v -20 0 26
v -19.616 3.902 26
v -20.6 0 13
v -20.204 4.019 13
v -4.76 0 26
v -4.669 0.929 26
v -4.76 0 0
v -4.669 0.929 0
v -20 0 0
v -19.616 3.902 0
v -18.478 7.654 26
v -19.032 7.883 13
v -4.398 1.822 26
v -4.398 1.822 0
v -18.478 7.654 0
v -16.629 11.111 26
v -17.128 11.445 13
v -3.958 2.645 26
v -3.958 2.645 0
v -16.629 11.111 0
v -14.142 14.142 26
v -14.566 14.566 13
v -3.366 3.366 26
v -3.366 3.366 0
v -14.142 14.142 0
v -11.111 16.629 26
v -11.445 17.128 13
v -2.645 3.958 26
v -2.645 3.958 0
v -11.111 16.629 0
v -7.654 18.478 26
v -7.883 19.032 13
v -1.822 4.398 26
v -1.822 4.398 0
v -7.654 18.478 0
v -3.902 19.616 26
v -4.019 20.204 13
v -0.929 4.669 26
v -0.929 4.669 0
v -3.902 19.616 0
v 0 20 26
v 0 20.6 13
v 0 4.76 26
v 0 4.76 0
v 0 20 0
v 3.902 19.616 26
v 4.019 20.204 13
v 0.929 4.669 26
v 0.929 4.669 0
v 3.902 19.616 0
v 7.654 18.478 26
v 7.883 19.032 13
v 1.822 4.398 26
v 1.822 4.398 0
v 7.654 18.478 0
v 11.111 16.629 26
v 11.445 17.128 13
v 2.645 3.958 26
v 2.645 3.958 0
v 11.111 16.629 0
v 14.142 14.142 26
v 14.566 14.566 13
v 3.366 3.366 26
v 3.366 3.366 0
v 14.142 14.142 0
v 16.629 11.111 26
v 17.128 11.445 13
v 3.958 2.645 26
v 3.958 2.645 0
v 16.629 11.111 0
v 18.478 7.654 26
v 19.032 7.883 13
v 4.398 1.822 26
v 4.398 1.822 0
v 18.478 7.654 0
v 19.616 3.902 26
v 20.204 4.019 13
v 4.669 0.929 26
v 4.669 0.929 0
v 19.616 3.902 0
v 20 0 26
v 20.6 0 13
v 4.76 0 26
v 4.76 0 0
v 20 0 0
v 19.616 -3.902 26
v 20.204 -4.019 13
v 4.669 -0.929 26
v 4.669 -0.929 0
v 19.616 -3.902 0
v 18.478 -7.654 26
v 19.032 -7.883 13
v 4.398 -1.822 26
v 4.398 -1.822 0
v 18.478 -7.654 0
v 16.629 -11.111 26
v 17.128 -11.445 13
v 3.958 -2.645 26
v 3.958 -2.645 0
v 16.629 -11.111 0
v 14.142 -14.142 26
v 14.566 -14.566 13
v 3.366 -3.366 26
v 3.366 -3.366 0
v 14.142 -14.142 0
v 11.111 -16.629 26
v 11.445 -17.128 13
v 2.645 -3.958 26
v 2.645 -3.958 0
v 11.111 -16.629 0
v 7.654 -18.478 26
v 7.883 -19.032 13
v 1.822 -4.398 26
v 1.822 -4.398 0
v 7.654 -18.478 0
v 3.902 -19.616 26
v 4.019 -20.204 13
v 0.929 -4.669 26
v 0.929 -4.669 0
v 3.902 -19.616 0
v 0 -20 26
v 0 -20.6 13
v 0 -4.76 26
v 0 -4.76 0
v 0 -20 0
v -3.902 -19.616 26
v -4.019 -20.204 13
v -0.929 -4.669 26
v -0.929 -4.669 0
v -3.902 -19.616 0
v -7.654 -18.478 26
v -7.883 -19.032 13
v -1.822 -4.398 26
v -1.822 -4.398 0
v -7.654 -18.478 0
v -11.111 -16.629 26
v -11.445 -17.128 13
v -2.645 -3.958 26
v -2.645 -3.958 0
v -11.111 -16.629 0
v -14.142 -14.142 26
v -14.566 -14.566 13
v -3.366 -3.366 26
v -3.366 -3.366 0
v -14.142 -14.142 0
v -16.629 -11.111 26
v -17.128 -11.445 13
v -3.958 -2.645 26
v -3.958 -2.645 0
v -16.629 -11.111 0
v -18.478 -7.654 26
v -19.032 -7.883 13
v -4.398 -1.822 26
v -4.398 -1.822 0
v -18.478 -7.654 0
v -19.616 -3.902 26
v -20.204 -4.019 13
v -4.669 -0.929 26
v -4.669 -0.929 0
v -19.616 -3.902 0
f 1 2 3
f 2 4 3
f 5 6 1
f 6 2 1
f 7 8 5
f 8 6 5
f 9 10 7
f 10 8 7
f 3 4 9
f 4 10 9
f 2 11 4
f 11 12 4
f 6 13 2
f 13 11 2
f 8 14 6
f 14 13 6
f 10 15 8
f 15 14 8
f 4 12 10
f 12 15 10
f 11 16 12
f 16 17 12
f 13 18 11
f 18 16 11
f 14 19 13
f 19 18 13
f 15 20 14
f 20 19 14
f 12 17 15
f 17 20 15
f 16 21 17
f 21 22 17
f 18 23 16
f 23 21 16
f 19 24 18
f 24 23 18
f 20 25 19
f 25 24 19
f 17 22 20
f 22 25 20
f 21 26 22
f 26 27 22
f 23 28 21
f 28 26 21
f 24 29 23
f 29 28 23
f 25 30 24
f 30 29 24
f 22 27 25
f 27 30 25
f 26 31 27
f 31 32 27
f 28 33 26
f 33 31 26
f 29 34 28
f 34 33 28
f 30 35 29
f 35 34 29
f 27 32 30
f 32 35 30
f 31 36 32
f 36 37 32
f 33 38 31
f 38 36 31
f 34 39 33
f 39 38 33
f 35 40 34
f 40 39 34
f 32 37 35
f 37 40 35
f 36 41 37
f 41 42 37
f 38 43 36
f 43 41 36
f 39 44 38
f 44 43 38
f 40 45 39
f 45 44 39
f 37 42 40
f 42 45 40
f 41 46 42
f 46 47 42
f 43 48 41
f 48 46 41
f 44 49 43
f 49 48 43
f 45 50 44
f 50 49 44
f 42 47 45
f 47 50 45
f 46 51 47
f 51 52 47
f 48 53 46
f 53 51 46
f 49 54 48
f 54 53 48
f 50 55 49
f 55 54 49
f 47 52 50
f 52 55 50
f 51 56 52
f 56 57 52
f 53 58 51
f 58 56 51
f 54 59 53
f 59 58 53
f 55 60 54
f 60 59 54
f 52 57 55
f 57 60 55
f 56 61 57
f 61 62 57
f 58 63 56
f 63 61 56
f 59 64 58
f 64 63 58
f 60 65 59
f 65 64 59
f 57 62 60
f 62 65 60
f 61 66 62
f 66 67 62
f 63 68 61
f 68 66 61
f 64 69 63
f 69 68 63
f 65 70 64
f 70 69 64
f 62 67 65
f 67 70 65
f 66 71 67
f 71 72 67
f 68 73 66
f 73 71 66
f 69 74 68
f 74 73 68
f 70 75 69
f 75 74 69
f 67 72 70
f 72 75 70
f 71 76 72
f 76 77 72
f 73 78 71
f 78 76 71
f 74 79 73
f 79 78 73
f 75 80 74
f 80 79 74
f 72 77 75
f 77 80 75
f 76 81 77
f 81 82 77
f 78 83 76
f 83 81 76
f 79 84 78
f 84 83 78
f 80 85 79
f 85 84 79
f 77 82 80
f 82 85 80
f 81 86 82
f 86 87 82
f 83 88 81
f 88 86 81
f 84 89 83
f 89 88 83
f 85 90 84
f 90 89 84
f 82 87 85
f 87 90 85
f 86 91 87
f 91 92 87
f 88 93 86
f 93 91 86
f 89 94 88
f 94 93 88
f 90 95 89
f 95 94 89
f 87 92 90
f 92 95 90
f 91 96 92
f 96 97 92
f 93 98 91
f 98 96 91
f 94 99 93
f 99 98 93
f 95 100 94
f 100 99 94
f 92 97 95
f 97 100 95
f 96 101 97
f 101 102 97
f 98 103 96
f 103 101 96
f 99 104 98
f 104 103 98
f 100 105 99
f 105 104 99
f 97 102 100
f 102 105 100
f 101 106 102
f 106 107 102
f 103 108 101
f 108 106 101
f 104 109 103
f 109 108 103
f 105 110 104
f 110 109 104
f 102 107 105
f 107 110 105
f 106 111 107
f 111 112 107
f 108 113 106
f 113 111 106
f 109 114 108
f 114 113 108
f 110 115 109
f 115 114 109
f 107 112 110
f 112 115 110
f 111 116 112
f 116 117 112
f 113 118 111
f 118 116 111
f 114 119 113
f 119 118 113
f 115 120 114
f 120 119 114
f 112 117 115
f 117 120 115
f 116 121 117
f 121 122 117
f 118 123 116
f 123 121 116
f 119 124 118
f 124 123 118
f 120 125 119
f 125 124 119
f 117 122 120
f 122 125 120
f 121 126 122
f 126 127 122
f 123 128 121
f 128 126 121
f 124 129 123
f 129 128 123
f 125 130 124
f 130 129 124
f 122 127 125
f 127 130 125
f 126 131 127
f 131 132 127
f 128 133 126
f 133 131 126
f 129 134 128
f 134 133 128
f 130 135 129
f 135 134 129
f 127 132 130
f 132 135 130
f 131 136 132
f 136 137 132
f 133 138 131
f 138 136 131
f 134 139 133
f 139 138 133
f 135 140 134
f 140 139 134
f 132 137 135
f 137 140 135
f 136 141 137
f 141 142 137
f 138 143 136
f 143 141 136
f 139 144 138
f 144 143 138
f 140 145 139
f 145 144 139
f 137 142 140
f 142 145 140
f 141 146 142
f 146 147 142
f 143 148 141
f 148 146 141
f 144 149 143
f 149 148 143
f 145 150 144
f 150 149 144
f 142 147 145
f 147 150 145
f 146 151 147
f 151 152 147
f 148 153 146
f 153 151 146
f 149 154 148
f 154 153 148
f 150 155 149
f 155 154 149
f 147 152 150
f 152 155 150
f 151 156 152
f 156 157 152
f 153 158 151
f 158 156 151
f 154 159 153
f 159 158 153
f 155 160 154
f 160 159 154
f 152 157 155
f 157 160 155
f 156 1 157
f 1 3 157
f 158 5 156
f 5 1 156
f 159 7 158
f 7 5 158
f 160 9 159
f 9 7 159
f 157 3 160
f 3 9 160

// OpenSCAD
$fn = 32;

// ----------------------------------------------------------------------
// Belt roller: 40 mm barrel, 26 mm wide, bore 9.52 mm
// ----------------------------------------------------------------------

// --- parameters (mm) ---
bore_d = 9.52;            // bore
barrel_d = 40;            // barrel diameter
roller_w = 26;            // roller width
crown = 0.6;              // crown height at mid width

roller_profile = [[4.76, 0], [20, 0], [20.6, 13], [20, 26], [4.76, 26]];

/* the profile stays clear of the axis, so the bore comes out of the revolve */
rotate_extrude() polygon(roller_profile);
